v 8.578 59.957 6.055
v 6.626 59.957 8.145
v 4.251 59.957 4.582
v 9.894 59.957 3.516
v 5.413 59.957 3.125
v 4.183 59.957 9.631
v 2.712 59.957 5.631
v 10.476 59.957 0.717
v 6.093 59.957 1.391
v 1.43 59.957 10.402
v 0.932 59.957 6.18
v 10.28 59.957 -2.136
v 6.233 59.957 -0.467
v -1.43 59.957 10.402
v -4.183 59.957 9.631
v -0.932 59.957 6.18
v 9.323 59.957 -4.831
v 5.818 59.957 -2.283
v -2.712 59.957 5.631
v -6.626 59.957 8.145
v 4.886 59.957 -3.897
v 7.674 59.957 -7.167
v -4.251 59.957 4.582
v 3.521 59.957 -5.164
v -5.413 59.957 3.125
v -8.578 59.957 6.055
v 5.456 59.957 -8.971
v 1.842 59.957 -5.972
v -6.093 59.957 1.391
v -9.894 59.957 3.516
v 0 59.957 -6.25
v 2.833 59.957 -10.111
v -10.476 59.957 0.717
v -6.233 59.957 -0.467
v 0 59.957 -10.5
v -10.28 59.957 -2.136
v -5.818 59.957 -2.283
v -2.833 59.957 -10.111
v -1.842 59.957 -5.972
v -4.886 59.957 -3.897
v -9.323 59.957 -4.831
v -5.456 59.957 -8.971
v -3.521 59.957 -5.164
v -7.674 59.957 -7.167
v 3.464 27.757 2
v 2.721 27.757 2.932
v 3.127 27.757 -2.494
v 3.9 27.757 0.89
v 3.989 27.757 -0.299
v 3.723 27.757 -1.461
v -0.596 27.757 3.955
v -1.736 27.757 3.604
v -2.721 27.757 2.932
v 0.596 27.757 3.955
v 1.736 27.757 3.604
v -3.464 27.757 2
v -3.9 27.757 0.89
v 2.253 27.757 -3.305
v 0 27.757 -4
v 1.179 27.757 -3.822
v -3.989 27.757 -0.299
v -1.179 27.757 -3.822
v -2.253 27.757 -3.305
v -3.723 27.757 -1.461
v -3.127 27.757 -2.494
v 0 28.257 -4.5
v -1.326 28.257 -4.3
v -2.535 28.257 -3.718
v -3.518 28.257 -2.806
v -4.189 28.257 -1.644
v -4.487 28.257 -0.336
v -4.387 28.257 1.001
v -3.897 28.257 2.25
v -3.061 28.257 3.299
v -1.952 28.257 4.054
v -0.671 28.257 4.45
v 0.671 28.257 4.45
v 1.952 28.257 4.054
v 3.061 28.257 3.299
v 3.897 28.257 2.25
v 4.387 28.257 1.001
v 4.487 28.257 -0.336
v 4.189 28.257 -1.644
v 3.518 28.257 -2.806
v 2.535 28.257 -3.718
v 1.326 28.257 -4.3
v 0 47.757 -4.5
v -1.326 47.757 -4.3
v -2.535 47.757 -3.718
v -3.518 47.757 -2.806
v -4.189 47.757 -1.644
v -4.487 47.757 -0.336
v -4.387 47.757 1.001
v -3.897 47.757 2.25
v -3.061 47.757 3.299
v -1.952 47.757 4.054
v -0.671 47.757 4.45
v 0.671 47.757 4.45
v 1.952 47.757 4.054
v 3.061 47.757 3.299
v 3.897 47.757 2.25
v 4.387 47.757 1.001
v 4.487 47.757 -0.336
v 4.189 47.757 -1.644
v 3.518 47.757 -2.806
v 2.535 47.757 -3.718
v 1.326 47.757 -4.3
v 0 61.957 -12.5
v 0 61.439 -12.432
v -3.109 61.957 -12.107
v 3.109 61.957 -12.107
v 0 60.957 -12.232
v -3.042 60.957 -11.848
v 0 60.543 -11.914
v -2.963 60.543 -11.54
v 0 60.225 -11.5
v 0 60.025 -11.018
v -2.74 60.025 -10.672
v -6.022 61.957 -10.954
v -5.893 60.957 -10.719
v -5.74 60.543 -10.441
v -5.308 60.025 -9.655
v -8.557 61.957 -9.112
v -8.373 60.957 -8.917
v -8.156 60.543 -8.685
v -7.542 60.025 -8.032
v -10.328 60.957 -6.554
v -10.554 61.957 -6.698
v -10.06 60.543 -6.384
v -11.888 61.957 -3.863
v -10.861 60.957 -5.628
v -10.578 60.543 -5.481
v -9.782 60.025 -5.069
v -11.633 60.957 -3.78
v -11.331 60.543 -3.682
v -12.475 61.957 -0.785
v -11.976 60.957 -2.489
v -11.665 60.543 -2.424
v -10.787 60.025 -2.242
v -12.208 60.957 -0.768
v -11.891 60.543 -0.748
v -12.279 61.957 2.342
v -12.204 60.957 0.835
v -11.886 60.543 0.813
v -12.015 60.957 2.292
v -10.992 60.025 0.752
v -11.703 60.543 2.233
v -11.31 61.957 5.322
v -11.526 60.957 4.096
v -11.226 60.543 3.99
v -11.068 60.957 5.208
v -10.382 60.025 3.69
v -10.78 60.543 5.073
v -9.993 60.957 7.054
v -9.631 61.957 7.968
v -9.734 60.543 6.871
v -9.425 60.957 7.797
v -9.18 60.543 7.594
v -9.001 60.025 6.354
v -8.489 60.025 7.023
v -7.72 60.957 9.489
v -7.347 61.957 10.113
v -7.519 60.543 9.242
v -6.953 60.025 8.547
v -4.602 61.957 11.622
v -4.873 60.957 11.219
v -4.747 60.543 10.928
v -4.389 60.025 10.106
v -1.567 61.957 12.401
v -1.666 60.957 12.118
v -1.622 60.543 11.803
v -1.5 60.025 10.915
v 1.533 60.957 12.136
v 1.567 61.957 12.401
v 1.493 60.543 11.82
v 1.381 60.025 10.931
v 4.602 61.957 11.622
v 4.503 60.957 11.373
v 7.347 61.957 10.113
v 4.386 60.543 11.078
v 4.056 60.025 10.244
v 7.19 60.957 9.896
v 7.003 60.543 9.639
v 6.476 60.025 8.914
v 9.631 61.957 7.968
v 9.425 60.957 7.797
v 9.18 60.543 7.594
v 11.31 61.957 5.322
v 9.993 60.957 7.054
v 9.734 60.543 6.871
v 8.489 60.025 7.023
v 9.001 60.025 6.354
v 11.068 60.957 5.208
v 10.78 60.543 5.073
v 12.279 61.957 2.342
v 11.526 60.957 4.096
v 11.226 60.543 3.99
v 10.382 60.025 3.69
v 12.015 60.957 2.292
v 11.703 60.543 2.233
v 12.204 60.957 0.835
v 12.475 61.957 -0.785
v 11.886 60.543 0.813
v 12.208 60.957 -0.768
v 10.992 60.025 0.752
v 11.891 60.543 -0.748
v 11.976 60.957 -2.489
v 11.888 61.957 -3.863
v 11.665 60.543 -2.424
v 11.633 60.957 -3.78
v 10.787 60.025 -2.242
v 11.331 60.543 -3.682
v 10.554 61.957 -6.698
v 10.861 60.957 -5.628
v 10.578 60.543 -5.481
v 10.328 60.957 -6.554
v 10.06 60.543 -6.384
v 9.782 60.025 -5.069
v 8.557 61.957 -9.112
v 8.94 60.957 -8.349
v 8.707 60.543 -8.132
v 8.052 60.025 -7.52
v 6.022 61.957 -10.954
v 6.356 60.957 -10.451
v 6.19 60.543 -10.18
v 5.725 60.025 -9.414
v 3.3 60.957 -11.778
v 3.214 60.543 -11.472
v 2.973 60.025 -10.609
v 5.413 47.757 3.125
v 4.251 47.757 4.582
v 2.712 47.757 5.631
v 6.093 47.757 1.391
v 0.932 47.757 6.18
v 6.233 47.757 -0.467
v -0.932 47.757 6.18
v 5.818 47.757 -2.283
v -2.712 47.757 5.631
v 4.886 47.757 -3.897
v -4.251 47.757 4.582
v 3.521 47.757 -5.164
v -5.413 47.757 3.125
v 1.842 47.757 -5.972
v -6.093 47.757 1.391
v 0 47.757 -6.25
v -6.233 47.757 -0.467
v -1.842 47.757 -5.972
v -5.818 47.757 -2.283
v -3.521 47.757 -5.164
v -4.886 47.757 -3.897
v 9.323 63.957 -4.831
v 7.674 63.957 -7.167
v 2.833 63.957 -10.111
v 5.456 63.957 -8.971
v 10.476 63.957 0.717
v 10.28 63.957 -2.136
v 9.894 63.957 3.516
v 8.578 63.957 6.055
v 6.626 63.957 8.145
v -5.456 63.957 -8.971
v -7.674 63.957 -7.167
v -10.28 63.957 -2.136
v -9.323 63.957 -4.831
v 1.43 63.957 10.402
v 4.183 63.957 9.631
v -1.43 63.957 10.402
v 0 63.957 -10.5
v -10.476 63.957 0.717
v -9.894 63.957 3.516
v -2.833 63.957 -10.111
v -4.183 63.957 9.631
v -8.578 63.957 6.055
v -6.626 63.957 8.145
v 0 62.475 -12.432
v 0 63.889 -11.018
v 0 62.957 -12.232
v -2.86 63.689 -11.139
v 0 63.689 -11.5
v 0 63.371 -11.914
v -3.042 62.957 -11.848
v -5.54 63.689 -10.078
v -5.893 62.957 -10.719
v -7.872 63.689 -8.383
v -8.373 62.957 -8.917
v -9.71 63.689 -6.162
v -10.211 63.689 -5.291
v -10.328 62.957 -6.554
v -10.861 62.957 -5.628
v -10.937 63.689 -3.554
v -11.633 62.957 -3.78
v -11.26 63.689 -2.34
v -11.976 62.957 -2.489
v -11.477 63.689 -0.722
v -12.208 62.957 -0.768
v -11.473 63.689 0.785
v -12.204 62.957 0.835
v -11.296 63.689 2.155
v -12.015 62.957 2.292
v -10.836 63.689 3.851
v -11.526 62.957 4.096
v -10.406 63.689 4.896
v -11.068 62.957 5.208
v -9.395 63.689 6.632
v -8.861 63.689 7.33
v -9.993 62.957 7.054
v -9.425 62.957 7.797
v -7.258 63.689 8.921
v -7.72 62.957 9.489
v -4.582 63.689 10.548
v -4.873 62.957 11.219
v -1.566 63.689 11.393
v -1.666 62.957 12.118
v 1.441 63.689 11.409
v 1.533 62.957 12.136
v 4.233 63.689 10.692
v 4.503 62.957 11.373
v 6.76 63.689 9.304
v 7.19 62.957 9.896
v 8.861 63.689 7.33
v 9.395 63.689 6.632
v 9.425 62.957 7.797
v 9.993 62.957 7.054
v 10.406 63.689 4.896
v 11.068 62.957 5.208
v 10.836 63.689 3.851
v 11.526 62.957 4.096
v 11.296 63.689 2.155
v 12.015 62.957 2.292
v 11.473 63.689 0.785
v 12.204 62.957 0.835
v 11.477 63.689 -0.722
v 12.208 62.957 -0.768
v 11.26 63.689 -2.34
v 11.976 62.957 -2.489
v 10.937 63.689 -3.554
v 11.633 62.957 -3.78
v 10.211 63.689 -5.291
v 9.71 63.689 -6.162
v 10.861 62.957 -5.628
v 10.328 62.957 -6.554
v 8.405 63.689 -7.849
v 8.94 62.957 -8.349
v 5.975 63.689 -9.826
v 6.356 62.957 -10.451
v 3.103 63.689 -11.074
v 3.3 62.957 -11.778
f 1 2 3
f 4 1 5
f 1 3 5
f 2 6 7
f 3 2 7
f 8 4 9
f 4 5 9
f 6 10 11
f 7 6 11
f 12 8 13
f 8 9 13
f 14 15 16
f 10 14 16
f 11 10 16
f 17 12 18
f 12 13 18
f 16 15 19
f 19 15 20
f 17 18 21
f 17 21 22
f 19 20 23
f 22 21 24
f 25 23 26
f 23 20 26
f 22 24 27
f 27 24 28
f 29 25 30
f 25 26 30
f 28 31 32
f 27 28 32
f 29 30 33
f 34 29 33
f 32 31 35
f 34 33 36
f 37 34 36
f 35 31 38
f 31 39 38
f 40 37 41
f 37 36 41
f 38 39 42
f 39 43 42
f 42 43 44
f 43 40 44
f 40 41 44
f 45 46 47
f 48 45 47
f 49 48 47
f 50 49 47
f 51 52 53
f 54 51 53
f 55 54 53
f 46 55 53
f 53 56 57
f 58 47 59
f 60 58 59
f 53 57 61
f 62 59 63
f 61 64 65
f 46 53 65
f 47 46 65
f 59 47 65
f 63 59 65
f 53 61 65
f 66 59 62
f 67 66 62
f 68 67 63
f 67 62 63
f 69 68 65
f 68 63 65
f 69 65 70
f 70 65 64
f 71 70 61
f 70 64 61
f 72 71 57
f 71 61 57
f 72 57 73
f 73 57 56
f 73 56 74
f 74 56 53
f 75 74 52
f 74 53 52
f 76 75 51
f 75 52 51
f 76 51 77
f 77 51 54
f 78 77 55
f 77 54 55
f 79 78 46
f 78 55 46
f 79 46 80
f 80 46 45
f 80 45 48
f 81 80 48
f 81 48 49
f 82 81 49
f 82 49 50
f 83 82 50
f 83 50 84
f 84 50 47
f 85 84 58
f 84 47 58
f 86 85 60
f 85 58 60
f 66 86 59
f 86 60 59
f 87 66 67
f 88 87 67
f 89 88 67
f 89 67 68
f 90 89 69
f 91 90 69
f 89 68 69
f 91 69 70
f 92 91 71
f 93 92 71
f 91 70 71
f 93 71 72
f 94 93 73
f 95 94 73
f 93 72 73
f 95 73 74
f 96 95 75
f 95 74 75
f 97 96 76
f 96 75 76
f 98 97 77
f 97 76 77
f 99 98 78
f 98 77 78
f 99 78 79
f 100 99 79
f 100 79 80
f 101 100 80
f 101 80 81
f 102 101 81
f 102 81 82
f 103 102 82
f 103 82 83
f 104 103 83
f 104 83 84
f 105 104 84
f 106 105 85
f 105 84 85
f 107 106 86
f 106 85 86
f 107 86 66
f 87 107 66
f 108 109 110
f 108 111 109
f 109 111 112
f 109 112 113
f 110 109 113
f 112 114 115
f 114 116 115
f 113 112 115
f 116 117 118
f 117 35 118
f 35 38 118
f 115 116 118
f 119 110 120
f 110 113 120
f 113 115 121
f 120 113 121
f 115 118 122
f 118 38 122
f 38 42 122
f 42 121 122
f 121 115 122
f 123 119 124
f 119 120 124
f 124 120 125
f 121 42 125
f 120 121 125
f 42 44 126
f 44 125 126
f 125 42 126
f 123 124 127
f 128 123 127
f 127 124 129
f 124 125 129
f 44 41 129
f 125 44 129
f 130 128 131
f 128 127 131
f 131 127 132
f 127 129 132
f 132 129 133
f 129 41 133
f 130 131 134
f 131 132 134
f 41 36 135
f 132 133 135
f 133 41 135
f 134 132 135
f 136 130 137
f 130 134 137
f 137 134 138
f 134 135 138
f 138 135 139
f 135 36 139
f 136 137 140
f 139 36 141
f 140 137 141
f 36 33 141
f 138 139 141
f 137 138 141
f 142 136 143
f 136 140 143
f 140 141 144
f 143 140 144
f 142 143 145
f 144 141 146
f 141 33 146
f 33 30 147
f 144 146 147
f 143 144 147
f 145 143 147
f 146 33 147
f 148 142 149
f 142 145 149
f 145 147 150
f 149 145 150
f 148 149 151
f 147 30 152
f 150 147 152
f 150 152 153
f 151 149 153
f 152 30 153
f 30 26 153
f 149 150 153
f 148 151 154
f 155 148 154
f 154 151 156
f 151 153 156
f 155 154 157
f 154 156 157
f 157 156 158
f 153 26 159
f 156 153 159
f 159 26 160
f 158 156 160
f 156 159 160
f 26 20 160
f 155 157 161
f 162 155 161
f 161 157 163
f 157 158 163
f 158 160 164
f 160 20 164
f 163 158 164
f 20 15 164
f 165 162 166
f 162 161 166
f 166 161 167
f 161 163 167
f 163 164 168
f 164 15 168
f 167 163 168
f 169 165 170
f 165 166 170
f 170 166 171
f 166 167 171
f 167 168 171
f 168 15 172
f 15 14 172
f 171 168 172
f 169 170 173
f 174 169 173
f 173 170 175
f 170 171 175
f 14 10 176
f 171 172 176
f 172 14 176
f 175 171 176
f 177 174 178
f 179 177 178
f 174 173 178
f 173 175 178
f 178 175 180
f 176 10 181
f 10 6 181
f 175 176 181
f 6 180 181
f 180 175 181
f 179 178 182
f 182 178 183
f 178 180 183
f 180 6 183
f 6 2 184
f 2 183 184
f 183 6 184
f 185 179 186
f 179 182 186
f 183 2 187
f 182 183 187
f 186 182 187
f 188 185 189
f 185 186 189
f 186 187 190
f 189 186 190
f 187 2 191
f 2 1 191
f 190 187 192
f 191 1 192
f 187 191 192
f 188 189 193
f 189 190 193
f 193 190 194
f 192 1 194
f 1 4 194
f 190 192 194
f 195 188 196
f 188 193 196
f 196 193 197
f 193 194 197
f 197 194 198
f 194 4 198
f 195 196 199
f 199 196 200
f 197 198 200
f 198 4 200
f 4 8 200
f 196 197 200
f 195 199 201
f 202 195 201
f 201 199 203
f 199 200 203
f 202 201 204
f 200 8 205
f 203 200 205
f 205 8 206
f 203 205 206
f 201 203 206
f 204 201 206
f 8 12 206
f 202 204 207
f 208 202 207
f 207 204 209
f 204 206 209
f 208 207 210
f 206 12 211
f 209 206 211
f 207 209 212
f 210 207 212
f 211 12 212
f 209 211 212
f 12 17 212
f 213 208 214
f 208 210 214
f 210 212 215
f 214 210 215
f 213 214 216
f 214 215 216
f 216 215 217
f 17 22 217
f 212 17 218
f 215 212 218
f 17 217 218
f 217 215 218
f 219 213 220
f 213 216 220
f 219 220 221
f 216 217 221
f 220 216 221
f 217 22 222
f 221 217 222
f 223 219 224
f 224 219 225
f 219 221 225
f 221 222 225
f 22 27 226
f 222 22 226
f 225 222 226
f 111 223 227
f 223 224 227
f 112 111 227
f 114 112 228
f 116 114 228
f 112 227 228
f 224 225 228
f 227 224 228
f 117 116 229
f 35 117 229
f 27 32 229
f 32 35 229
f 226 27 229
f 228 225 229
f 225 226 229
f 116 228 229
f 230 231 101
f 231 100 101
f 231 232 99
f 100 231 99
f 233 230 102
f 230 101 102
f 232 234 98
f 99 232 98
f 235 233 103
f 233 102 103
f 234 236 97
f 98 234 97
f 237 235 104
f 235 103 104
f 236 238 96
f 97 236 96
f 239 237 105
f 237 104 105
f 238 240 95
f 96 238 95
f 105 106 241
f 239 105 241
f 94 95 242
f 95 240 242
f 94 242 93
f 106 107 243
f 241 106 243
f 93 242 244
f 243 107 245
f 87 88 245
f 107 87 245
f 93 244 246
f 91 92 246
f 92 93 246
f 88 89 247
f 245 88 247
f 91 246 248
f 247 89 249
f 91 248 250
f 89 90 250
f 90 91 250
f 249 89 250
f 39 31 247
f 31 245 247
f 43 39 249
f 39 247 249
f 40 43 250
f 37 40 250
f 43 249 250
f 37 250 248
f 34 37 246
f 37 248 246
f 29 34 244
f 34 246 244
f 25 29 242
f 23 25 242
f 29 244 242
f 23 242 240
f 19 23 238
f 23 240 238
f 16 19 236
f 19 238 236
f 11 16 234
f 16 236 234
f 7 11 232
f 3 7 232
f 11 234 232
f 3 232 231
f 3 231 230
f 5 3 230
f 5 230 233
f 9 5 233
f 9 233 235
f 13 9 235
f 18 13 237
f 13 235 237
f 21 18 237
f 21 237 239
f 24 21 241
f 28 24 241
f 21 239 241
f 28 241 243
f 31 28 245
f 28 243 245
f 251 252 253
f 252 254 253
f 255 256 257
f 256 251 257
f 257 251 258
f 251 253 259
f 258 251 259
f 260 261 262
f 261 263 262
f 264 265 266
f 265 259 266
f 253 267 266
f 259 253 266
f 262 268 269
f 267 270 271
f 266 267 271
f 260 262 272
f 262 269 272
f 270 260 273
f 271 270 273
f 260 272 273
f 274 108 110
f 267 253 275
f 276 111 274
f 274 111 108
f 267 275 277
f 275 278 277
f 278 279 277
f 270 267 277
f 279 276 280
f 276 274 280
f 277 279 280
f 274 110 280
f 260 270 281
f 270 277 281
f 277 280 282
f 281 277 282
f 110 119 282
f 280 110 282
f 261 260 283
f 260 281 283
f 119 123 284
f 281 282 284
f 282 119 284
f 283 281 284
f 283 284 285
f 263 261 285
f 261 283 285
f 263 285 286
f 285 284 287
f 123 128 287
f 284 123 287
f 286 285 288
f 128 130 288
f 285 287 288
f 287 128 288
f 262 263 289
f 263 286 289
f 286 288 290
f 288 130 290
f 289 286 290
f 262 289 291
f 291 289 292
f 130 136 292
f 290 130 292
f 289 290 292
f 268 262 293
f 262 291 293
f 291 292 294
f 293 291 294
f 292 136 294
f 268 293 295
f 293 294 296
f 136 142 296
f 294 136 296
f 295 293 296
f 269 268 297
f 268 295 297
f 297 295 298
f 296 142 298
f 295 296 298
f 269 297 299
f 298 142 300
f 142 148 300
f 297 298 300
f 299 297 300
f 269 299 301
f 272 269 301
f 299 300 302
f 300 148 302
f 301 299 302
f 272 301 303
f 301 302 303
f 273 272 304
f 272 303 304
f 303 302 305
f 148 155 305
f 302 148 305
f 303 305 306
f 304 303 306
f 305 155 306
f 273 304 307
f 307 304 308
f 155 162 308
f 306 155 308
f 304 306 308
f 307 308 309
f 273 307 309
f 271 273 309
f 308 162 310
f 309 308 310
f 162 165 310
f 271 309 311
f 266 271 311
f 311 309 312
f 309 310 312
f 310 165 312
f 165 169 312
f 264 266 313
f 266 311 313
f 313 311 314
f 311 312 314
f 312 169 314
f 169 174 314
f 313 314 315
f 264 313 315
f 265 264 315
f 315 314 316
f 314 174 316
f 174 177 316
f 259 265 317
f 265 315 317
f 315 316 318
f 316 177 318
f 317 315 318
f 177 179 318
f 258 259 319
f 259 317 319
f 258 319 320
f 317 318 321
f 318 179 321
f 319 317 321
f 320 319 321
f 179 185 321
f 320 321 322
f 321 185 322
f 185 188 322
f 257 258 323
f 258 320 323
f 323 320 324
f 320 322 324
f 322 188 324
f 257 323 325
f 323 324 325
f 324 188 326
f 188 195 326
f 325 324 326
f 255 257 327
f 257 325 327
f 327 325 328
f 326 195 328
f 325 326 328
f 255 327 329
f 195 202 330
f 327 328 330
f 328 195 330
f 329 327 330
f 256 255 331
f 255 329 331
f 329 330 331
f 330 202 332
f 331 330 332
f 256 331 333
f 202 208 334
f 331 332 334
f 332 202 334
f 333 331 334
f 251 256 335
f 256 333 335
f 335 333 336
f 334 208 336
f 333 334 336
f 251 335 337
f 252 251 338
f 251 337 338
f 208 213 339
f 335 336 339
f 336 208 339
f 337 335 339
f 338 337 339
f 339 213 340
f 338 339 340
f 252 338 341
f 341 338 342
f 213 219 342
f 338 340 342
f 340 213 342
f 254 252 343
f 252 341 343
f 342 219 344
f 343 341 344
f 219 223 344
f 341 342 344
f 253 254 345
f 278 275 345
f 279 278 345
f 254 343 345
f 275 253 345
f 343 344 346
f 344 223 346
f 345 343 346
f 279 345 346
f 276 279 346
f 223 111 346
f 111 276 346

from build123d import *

# Parameters (mm, degrees)
FILETE1_R     = 2
CHANFRO1_SIZE = 0.5


with BuildPart() as part:
    # Esboço1 → Revolução1 (revolve)
    with BuildSketch(Plane.XY, mode=Mode.PRIVATE) as revolu_o1_sk:
        Polygon((0, 63.957087486), (12.5, 63.957087486), (12.5, 59.957087486), (6.25, 59.957087486), (6.25, 47.757087486), (4.5, 47.757087486), (4.5, 27.757087486), (0, 27.757087486), align=None)
    revolve(revolu_o1_sk.sketch.rotate(Axis((0, -74.716223699, 0), (0, 1, 0)), 90), axis=Axis((0, -74.716223699, 0), (0, 1, 0)))

    # Filete1
    filete1_edges = [part.edges().sort_by_distance(p)[0] for p in [
        (0, 59.957087486, 12.5),
        (0, 63.957087486, 12.5),
    ]]
    fillet(filete1_edges, radius=FILETE1_R - 0.0001)  # a hair under: the kernel refuses the full size

    # Chanfro1
    chanfro1_edges = [part.edges().sort_by_distance(p)[0] for p in [
        (0, 27.757087486, 4.5),
    ]]
    chamfer(chanfro1_edges, length=CHANFRO1_SIZE)


solid = part.part
